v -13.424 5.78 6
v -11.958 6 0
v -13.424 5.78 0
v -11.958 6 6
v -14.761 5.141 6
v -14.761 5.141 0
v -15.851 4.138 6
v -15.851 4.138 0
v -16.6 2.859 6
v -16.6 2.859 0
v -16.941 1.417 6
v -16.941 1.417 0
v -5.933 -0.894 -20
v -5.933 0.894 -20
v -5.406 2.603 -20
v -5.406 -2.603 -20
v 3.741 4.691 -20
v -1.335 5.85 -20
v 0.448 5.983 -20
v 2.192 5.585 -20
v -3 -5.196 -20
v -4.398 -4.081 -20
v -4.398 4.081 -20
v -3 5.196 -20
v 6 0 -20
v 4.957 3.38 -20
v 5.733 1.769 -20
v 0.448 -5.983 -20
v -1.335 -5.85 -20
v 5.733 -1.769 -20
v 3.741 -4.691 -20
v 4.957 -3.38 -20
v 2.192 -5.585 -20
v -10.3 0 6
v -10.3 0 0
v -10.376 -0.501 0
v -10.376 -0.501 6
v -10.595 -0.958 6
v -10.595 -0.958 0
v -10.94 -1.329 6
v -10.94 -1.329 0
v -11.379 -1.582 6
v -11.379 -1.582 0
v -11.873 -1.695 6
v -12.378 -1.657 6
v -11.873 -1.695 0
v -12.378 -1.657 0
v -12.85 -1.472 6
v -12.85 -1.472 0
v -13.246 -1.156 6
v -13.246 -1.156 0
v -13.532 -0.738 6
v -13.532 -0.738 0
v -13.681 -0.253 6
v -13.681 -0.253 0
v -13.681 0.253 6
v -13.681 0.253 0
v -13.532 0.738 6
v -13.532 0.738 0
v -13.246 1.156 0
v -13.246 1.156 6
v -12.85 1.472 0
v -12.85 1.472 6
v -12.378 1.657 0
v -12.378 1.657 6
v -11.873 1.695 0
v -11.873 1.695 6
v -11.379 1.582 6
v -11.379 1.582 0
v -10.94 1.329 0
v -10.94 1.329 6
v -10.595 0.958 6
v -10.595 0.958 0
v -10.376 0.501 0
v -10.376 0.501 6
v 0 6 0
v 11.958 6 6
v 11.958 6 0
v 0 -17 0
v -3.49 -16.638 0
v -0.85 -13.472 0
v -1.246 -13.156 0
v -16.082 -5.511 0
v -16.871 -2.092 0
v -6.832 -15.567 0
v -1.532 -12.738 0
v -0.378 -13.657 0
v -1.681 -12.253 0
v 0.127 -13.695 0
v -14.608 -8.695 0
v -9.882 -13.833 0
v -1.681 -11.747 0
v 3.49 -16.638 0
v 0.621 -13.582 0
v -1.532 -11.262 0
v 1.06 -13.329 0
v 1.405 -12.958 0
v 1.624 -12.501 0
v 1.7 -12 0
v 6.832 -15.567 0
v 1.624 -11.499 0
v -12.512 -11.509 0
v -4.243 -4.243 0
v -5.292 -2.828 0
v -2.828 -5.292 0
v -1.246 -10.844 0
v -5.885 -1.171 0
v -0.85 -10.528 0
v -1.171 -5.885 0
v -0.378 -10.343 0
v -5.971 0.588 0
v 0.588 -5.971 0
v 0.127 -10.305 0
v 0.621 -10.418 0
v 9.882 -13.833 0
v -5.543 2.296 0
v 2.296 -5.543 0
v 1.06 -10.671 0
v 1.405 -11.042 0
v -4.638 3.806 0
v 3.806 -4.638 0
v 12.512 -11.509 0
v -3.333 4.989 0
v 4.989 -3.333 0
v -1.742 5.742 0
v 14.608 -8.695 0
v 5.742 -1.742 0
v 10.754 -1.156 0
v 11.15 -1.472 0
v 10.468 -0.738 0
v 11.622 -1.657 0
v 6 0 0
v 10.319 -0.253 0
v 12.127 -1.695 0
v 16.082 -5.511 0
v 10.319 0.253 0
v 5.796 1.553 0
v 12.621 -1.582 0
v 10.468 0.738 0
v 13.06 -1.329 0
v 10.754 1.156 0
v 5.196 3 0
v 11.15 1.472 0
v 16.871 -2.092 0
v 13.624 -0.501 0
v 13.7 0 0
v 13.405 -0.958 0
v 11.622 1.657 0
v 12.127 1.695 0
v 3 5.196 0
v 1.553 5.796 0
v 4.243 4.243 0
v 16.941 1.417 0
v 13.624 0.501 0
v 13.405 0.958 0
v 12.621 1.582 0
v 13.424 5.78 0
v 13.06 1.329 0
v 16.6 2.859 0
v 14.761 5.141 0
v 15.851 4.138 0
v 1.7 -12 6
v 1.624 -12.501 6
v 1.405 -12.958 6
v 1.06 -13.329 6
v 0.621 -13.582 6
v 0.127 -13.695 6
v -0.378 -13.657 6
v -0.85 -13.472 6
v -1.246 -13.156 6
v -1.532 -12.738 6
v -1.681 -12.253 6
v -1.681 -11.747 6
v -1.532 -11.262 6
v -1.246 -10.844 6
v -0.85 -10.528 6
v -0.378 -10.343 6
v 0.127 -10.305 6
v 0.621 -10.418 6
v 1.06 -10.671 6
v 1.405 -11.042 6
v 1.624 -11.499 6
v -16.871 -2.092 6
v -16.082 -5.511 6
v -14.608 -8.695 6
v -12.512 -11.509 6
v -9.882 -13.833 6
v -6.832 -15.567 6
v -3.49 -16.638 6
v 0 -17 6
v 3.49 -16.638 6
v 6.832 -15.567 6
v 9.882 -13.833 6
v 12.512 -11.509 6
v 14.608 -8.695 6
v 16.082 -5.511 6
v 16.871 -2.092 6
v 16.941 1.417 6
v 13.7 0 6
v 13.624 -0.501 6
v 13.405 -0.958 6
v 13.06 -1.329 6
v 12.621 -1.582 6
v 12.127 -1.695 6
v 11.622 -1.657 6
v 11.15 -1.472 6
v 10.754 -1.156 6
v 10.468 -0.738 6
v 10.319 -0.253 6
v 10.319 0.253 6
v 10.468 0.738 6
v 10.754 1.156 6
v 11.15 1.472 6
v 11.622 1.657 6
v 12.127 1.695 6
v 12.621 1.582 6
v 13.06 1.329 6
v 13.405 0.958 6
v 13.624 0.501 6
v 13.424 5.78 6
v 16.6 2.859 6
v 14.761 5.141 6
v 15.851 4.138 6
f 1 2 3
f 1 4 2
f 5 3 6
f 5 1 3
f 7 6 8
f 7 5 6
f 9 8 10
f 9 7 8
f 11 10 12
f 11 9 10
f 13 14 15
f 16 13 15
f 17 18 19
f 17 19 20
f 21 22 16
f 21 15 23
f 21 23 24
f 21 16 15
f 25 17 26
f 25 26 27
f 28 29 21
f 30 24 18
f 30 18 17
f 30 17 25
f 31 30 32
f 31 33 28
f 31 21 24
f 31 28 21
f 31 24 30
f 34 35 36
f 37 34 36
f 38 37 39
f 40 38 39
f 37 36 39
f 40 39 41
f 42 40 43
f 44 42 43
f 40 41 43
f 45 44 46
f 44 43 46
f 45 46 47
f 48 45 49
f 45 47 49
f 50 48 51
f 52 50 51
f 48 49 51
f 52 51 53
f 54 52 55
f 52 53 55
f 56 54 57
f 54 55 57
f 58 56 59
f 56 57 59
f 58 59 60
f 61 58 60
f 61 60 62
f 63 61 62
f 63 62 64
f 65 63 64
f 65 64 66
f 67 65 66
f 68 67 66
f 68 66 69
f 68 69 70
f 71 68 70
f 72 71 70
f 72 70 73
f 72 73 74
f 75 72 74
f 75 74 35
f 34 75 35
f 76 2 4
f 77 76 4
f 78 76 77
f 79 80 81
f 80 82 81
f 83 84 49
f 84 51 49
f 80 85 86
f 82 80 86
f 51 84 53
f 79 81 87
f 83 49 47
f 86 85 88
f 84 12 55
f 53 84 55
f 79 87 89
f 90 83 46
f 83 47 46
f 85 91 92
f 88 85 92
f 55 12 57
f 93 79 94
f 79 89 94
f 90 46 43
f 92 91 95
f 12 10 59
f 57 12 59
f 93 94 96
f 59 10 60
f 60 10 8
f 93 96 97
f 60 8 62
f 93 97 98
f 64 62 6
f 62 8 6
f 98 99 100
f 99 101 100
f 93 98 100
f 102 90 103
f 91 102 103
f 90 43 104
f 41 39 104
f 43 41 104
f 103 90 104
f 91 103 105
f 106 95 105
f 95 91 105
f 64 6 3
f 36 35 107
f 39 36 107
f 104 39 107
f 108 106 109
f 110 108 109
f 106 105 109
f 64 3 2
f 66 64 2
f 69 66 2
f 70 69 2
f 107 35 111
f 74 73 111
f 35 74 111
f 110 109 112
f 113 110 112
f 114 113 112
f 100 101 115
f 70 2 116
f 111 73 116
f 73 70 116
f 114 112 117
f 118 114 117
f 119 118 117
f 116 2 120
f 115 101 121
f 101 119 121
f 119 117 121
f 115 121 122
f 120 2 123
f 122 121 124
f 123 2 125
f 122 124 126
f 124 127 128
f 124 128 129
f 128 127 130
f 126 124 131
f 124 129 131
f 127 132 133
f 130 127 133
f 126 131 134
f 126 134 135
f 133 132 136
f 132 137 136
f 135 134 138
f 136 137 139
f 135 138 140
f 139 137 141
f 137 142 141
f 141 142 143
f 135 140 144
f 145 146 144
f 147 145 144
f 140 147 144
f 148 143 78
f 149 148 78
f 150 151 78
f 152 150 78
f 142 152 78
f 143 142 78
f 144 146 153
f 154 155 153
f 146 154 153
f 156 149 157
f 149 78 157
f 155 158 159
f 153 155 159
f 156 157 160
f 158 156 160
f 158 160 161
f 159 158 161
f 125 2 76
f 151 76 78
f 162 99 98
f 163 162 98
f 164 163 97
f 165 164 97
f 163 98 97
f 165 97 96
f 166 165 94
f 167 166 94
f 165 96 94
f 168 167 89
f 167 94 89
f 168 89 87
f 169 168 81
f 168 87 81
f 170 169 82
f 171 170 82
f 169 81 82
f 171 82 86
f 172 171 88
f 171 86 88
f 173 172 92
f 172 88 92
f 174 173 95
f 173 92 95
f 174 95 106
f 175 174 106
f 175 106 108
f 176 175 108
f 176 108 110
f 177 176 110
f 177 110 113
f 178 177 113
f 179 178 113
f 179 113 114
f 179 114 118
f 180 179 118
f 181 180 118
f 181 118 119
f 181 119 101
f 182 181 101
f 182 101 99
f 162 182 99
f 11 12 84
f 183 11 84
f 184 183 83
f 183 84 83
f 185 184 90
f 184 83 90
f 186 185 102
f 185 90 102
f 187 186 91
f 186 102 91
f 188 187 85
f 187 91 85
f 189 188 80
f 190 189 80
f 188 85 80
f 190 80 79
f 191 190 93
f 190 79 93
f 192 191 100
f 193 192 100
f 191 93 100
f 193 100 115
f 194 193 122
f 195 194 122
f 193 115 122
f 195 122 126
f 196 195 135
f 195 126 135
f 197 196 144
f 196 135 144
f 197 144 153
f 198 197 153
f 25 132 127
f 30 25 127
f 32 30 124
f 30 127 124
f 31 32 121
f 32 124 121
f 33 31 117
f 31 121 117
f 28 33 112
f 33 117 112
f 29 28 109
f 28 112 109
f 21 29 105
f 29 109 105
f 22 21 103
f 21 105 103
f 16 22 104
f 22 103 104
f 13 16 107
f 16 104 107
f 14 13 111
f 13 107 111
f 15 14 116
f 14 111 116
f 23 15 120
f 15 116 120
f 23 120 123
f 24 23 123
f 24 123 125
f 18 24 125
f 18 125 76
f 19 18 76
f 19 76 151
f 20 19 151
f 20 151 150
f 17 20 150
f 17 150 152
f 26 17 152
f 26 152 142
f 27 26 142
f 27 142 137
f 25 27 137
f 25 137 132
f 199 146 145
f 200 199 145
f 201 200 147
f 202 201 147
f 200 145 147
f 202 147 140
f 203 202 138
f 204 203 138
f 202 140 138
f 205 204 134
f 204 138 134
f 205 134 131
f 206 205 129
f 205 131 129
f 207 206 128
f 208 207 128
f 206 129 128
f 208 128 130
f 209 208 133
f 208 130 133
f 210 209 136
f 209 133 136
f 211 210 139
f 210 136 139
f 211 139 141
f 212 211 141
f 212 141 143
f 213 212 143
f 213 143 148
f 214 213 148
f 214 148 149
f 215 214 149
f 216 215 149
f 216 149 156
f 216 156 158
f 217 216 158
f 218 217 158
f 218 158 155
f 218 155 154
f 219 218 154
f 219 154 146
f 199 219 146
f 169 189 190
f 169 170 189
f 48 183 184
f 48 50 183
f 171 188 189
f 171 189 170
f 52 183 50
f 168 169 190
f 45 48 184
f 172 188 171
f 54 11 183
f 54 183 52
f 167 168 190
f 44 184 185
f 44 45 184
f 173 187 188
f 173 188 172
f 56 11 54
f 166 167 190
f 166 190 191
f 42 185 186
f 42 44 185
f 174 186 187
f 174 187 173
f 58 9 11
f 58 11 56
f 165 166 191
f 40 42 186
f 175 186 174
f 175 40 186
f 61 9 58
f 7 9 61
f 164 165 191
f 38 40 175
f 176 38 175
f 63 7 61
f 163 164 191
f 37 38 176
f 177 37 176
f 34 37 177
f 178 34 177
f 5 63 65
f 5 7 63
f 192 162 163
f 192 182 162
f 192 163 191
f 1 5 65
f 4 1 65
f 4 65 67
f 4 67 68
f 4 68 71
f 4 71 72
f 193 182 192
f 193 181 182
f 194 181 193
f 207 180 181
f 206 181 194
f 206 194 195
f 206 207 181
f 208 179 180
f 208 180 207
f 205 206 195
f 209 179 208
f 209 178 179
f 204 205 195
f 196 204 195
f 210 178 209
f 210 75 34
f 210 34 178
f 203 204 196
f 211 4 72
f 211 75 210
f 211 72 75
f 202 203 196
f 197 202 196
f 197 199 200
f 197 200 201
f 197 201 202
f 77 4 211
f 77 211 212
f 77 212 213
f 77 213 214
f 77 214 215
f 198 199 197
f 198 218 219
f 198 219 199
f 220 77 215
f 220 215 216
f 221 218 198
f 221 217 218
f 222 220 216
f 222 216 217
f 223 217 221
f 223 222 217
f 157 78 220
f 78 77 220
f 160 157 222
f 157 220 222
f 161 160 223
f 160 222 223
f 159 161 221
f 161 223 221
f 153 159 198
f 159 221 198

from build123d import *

# Parameters (mm, degrees)
PAD_DEPTH    = 6
SKETCH001_R  = 6
PAD001_DEPTH = 20
SKETCH002_R  = 1.7
POCKET_DEPTH = 6.001
FILLET_R     = 5


with BuildPart() as part:
    # Sketch → Pad (new body)
    with BuildSketch(Plane.XY):
        with BuildLine():
            ThreePointArc((-15.905974, 6), (0, -17), (15.905974, 6))
            Line((-15.905974, 6), (15.905974, 6))
        make_face()
    extrude(amount=PAD_DEPTH)

    # Sketch001 → Pad001 (new body)
    with BuildSketch(Plane(origin=(0, 0, 0), x_dir=(1, 0, 0), z_dir=(0, 0, -1))):
        Circle(SKETCH001_R)
    extrude(amount=PAD001_DEPTH)

    # Sketch002 → Pocket (cut, through all)
    with BuildSketch(Plane(origin=(0, 0, 0), x_dir=(1, 0, 0), z_dir=(0, 0, -1))):
        with Locations((12, 0)):
            Circle(SKETCH002_R)
        with Locations((-12, 0)):
            Circle(SKETCH002_R)
        with Locations((0, 12)):
            Circle(SKETCH002_R)
    extrude(amount=-POCKET_DEPTH, mode=Mode.SUBTRACT)

    # Fillet
    fillet_edges = [part.edges().sort_by_distance(p)[0] for p in [
        (-15.905974, 6, 3),
        (15.905974, 6, 3),
    ]]
    fillet(fillet_edges, radius=FILLET_R)


solid = part.part
